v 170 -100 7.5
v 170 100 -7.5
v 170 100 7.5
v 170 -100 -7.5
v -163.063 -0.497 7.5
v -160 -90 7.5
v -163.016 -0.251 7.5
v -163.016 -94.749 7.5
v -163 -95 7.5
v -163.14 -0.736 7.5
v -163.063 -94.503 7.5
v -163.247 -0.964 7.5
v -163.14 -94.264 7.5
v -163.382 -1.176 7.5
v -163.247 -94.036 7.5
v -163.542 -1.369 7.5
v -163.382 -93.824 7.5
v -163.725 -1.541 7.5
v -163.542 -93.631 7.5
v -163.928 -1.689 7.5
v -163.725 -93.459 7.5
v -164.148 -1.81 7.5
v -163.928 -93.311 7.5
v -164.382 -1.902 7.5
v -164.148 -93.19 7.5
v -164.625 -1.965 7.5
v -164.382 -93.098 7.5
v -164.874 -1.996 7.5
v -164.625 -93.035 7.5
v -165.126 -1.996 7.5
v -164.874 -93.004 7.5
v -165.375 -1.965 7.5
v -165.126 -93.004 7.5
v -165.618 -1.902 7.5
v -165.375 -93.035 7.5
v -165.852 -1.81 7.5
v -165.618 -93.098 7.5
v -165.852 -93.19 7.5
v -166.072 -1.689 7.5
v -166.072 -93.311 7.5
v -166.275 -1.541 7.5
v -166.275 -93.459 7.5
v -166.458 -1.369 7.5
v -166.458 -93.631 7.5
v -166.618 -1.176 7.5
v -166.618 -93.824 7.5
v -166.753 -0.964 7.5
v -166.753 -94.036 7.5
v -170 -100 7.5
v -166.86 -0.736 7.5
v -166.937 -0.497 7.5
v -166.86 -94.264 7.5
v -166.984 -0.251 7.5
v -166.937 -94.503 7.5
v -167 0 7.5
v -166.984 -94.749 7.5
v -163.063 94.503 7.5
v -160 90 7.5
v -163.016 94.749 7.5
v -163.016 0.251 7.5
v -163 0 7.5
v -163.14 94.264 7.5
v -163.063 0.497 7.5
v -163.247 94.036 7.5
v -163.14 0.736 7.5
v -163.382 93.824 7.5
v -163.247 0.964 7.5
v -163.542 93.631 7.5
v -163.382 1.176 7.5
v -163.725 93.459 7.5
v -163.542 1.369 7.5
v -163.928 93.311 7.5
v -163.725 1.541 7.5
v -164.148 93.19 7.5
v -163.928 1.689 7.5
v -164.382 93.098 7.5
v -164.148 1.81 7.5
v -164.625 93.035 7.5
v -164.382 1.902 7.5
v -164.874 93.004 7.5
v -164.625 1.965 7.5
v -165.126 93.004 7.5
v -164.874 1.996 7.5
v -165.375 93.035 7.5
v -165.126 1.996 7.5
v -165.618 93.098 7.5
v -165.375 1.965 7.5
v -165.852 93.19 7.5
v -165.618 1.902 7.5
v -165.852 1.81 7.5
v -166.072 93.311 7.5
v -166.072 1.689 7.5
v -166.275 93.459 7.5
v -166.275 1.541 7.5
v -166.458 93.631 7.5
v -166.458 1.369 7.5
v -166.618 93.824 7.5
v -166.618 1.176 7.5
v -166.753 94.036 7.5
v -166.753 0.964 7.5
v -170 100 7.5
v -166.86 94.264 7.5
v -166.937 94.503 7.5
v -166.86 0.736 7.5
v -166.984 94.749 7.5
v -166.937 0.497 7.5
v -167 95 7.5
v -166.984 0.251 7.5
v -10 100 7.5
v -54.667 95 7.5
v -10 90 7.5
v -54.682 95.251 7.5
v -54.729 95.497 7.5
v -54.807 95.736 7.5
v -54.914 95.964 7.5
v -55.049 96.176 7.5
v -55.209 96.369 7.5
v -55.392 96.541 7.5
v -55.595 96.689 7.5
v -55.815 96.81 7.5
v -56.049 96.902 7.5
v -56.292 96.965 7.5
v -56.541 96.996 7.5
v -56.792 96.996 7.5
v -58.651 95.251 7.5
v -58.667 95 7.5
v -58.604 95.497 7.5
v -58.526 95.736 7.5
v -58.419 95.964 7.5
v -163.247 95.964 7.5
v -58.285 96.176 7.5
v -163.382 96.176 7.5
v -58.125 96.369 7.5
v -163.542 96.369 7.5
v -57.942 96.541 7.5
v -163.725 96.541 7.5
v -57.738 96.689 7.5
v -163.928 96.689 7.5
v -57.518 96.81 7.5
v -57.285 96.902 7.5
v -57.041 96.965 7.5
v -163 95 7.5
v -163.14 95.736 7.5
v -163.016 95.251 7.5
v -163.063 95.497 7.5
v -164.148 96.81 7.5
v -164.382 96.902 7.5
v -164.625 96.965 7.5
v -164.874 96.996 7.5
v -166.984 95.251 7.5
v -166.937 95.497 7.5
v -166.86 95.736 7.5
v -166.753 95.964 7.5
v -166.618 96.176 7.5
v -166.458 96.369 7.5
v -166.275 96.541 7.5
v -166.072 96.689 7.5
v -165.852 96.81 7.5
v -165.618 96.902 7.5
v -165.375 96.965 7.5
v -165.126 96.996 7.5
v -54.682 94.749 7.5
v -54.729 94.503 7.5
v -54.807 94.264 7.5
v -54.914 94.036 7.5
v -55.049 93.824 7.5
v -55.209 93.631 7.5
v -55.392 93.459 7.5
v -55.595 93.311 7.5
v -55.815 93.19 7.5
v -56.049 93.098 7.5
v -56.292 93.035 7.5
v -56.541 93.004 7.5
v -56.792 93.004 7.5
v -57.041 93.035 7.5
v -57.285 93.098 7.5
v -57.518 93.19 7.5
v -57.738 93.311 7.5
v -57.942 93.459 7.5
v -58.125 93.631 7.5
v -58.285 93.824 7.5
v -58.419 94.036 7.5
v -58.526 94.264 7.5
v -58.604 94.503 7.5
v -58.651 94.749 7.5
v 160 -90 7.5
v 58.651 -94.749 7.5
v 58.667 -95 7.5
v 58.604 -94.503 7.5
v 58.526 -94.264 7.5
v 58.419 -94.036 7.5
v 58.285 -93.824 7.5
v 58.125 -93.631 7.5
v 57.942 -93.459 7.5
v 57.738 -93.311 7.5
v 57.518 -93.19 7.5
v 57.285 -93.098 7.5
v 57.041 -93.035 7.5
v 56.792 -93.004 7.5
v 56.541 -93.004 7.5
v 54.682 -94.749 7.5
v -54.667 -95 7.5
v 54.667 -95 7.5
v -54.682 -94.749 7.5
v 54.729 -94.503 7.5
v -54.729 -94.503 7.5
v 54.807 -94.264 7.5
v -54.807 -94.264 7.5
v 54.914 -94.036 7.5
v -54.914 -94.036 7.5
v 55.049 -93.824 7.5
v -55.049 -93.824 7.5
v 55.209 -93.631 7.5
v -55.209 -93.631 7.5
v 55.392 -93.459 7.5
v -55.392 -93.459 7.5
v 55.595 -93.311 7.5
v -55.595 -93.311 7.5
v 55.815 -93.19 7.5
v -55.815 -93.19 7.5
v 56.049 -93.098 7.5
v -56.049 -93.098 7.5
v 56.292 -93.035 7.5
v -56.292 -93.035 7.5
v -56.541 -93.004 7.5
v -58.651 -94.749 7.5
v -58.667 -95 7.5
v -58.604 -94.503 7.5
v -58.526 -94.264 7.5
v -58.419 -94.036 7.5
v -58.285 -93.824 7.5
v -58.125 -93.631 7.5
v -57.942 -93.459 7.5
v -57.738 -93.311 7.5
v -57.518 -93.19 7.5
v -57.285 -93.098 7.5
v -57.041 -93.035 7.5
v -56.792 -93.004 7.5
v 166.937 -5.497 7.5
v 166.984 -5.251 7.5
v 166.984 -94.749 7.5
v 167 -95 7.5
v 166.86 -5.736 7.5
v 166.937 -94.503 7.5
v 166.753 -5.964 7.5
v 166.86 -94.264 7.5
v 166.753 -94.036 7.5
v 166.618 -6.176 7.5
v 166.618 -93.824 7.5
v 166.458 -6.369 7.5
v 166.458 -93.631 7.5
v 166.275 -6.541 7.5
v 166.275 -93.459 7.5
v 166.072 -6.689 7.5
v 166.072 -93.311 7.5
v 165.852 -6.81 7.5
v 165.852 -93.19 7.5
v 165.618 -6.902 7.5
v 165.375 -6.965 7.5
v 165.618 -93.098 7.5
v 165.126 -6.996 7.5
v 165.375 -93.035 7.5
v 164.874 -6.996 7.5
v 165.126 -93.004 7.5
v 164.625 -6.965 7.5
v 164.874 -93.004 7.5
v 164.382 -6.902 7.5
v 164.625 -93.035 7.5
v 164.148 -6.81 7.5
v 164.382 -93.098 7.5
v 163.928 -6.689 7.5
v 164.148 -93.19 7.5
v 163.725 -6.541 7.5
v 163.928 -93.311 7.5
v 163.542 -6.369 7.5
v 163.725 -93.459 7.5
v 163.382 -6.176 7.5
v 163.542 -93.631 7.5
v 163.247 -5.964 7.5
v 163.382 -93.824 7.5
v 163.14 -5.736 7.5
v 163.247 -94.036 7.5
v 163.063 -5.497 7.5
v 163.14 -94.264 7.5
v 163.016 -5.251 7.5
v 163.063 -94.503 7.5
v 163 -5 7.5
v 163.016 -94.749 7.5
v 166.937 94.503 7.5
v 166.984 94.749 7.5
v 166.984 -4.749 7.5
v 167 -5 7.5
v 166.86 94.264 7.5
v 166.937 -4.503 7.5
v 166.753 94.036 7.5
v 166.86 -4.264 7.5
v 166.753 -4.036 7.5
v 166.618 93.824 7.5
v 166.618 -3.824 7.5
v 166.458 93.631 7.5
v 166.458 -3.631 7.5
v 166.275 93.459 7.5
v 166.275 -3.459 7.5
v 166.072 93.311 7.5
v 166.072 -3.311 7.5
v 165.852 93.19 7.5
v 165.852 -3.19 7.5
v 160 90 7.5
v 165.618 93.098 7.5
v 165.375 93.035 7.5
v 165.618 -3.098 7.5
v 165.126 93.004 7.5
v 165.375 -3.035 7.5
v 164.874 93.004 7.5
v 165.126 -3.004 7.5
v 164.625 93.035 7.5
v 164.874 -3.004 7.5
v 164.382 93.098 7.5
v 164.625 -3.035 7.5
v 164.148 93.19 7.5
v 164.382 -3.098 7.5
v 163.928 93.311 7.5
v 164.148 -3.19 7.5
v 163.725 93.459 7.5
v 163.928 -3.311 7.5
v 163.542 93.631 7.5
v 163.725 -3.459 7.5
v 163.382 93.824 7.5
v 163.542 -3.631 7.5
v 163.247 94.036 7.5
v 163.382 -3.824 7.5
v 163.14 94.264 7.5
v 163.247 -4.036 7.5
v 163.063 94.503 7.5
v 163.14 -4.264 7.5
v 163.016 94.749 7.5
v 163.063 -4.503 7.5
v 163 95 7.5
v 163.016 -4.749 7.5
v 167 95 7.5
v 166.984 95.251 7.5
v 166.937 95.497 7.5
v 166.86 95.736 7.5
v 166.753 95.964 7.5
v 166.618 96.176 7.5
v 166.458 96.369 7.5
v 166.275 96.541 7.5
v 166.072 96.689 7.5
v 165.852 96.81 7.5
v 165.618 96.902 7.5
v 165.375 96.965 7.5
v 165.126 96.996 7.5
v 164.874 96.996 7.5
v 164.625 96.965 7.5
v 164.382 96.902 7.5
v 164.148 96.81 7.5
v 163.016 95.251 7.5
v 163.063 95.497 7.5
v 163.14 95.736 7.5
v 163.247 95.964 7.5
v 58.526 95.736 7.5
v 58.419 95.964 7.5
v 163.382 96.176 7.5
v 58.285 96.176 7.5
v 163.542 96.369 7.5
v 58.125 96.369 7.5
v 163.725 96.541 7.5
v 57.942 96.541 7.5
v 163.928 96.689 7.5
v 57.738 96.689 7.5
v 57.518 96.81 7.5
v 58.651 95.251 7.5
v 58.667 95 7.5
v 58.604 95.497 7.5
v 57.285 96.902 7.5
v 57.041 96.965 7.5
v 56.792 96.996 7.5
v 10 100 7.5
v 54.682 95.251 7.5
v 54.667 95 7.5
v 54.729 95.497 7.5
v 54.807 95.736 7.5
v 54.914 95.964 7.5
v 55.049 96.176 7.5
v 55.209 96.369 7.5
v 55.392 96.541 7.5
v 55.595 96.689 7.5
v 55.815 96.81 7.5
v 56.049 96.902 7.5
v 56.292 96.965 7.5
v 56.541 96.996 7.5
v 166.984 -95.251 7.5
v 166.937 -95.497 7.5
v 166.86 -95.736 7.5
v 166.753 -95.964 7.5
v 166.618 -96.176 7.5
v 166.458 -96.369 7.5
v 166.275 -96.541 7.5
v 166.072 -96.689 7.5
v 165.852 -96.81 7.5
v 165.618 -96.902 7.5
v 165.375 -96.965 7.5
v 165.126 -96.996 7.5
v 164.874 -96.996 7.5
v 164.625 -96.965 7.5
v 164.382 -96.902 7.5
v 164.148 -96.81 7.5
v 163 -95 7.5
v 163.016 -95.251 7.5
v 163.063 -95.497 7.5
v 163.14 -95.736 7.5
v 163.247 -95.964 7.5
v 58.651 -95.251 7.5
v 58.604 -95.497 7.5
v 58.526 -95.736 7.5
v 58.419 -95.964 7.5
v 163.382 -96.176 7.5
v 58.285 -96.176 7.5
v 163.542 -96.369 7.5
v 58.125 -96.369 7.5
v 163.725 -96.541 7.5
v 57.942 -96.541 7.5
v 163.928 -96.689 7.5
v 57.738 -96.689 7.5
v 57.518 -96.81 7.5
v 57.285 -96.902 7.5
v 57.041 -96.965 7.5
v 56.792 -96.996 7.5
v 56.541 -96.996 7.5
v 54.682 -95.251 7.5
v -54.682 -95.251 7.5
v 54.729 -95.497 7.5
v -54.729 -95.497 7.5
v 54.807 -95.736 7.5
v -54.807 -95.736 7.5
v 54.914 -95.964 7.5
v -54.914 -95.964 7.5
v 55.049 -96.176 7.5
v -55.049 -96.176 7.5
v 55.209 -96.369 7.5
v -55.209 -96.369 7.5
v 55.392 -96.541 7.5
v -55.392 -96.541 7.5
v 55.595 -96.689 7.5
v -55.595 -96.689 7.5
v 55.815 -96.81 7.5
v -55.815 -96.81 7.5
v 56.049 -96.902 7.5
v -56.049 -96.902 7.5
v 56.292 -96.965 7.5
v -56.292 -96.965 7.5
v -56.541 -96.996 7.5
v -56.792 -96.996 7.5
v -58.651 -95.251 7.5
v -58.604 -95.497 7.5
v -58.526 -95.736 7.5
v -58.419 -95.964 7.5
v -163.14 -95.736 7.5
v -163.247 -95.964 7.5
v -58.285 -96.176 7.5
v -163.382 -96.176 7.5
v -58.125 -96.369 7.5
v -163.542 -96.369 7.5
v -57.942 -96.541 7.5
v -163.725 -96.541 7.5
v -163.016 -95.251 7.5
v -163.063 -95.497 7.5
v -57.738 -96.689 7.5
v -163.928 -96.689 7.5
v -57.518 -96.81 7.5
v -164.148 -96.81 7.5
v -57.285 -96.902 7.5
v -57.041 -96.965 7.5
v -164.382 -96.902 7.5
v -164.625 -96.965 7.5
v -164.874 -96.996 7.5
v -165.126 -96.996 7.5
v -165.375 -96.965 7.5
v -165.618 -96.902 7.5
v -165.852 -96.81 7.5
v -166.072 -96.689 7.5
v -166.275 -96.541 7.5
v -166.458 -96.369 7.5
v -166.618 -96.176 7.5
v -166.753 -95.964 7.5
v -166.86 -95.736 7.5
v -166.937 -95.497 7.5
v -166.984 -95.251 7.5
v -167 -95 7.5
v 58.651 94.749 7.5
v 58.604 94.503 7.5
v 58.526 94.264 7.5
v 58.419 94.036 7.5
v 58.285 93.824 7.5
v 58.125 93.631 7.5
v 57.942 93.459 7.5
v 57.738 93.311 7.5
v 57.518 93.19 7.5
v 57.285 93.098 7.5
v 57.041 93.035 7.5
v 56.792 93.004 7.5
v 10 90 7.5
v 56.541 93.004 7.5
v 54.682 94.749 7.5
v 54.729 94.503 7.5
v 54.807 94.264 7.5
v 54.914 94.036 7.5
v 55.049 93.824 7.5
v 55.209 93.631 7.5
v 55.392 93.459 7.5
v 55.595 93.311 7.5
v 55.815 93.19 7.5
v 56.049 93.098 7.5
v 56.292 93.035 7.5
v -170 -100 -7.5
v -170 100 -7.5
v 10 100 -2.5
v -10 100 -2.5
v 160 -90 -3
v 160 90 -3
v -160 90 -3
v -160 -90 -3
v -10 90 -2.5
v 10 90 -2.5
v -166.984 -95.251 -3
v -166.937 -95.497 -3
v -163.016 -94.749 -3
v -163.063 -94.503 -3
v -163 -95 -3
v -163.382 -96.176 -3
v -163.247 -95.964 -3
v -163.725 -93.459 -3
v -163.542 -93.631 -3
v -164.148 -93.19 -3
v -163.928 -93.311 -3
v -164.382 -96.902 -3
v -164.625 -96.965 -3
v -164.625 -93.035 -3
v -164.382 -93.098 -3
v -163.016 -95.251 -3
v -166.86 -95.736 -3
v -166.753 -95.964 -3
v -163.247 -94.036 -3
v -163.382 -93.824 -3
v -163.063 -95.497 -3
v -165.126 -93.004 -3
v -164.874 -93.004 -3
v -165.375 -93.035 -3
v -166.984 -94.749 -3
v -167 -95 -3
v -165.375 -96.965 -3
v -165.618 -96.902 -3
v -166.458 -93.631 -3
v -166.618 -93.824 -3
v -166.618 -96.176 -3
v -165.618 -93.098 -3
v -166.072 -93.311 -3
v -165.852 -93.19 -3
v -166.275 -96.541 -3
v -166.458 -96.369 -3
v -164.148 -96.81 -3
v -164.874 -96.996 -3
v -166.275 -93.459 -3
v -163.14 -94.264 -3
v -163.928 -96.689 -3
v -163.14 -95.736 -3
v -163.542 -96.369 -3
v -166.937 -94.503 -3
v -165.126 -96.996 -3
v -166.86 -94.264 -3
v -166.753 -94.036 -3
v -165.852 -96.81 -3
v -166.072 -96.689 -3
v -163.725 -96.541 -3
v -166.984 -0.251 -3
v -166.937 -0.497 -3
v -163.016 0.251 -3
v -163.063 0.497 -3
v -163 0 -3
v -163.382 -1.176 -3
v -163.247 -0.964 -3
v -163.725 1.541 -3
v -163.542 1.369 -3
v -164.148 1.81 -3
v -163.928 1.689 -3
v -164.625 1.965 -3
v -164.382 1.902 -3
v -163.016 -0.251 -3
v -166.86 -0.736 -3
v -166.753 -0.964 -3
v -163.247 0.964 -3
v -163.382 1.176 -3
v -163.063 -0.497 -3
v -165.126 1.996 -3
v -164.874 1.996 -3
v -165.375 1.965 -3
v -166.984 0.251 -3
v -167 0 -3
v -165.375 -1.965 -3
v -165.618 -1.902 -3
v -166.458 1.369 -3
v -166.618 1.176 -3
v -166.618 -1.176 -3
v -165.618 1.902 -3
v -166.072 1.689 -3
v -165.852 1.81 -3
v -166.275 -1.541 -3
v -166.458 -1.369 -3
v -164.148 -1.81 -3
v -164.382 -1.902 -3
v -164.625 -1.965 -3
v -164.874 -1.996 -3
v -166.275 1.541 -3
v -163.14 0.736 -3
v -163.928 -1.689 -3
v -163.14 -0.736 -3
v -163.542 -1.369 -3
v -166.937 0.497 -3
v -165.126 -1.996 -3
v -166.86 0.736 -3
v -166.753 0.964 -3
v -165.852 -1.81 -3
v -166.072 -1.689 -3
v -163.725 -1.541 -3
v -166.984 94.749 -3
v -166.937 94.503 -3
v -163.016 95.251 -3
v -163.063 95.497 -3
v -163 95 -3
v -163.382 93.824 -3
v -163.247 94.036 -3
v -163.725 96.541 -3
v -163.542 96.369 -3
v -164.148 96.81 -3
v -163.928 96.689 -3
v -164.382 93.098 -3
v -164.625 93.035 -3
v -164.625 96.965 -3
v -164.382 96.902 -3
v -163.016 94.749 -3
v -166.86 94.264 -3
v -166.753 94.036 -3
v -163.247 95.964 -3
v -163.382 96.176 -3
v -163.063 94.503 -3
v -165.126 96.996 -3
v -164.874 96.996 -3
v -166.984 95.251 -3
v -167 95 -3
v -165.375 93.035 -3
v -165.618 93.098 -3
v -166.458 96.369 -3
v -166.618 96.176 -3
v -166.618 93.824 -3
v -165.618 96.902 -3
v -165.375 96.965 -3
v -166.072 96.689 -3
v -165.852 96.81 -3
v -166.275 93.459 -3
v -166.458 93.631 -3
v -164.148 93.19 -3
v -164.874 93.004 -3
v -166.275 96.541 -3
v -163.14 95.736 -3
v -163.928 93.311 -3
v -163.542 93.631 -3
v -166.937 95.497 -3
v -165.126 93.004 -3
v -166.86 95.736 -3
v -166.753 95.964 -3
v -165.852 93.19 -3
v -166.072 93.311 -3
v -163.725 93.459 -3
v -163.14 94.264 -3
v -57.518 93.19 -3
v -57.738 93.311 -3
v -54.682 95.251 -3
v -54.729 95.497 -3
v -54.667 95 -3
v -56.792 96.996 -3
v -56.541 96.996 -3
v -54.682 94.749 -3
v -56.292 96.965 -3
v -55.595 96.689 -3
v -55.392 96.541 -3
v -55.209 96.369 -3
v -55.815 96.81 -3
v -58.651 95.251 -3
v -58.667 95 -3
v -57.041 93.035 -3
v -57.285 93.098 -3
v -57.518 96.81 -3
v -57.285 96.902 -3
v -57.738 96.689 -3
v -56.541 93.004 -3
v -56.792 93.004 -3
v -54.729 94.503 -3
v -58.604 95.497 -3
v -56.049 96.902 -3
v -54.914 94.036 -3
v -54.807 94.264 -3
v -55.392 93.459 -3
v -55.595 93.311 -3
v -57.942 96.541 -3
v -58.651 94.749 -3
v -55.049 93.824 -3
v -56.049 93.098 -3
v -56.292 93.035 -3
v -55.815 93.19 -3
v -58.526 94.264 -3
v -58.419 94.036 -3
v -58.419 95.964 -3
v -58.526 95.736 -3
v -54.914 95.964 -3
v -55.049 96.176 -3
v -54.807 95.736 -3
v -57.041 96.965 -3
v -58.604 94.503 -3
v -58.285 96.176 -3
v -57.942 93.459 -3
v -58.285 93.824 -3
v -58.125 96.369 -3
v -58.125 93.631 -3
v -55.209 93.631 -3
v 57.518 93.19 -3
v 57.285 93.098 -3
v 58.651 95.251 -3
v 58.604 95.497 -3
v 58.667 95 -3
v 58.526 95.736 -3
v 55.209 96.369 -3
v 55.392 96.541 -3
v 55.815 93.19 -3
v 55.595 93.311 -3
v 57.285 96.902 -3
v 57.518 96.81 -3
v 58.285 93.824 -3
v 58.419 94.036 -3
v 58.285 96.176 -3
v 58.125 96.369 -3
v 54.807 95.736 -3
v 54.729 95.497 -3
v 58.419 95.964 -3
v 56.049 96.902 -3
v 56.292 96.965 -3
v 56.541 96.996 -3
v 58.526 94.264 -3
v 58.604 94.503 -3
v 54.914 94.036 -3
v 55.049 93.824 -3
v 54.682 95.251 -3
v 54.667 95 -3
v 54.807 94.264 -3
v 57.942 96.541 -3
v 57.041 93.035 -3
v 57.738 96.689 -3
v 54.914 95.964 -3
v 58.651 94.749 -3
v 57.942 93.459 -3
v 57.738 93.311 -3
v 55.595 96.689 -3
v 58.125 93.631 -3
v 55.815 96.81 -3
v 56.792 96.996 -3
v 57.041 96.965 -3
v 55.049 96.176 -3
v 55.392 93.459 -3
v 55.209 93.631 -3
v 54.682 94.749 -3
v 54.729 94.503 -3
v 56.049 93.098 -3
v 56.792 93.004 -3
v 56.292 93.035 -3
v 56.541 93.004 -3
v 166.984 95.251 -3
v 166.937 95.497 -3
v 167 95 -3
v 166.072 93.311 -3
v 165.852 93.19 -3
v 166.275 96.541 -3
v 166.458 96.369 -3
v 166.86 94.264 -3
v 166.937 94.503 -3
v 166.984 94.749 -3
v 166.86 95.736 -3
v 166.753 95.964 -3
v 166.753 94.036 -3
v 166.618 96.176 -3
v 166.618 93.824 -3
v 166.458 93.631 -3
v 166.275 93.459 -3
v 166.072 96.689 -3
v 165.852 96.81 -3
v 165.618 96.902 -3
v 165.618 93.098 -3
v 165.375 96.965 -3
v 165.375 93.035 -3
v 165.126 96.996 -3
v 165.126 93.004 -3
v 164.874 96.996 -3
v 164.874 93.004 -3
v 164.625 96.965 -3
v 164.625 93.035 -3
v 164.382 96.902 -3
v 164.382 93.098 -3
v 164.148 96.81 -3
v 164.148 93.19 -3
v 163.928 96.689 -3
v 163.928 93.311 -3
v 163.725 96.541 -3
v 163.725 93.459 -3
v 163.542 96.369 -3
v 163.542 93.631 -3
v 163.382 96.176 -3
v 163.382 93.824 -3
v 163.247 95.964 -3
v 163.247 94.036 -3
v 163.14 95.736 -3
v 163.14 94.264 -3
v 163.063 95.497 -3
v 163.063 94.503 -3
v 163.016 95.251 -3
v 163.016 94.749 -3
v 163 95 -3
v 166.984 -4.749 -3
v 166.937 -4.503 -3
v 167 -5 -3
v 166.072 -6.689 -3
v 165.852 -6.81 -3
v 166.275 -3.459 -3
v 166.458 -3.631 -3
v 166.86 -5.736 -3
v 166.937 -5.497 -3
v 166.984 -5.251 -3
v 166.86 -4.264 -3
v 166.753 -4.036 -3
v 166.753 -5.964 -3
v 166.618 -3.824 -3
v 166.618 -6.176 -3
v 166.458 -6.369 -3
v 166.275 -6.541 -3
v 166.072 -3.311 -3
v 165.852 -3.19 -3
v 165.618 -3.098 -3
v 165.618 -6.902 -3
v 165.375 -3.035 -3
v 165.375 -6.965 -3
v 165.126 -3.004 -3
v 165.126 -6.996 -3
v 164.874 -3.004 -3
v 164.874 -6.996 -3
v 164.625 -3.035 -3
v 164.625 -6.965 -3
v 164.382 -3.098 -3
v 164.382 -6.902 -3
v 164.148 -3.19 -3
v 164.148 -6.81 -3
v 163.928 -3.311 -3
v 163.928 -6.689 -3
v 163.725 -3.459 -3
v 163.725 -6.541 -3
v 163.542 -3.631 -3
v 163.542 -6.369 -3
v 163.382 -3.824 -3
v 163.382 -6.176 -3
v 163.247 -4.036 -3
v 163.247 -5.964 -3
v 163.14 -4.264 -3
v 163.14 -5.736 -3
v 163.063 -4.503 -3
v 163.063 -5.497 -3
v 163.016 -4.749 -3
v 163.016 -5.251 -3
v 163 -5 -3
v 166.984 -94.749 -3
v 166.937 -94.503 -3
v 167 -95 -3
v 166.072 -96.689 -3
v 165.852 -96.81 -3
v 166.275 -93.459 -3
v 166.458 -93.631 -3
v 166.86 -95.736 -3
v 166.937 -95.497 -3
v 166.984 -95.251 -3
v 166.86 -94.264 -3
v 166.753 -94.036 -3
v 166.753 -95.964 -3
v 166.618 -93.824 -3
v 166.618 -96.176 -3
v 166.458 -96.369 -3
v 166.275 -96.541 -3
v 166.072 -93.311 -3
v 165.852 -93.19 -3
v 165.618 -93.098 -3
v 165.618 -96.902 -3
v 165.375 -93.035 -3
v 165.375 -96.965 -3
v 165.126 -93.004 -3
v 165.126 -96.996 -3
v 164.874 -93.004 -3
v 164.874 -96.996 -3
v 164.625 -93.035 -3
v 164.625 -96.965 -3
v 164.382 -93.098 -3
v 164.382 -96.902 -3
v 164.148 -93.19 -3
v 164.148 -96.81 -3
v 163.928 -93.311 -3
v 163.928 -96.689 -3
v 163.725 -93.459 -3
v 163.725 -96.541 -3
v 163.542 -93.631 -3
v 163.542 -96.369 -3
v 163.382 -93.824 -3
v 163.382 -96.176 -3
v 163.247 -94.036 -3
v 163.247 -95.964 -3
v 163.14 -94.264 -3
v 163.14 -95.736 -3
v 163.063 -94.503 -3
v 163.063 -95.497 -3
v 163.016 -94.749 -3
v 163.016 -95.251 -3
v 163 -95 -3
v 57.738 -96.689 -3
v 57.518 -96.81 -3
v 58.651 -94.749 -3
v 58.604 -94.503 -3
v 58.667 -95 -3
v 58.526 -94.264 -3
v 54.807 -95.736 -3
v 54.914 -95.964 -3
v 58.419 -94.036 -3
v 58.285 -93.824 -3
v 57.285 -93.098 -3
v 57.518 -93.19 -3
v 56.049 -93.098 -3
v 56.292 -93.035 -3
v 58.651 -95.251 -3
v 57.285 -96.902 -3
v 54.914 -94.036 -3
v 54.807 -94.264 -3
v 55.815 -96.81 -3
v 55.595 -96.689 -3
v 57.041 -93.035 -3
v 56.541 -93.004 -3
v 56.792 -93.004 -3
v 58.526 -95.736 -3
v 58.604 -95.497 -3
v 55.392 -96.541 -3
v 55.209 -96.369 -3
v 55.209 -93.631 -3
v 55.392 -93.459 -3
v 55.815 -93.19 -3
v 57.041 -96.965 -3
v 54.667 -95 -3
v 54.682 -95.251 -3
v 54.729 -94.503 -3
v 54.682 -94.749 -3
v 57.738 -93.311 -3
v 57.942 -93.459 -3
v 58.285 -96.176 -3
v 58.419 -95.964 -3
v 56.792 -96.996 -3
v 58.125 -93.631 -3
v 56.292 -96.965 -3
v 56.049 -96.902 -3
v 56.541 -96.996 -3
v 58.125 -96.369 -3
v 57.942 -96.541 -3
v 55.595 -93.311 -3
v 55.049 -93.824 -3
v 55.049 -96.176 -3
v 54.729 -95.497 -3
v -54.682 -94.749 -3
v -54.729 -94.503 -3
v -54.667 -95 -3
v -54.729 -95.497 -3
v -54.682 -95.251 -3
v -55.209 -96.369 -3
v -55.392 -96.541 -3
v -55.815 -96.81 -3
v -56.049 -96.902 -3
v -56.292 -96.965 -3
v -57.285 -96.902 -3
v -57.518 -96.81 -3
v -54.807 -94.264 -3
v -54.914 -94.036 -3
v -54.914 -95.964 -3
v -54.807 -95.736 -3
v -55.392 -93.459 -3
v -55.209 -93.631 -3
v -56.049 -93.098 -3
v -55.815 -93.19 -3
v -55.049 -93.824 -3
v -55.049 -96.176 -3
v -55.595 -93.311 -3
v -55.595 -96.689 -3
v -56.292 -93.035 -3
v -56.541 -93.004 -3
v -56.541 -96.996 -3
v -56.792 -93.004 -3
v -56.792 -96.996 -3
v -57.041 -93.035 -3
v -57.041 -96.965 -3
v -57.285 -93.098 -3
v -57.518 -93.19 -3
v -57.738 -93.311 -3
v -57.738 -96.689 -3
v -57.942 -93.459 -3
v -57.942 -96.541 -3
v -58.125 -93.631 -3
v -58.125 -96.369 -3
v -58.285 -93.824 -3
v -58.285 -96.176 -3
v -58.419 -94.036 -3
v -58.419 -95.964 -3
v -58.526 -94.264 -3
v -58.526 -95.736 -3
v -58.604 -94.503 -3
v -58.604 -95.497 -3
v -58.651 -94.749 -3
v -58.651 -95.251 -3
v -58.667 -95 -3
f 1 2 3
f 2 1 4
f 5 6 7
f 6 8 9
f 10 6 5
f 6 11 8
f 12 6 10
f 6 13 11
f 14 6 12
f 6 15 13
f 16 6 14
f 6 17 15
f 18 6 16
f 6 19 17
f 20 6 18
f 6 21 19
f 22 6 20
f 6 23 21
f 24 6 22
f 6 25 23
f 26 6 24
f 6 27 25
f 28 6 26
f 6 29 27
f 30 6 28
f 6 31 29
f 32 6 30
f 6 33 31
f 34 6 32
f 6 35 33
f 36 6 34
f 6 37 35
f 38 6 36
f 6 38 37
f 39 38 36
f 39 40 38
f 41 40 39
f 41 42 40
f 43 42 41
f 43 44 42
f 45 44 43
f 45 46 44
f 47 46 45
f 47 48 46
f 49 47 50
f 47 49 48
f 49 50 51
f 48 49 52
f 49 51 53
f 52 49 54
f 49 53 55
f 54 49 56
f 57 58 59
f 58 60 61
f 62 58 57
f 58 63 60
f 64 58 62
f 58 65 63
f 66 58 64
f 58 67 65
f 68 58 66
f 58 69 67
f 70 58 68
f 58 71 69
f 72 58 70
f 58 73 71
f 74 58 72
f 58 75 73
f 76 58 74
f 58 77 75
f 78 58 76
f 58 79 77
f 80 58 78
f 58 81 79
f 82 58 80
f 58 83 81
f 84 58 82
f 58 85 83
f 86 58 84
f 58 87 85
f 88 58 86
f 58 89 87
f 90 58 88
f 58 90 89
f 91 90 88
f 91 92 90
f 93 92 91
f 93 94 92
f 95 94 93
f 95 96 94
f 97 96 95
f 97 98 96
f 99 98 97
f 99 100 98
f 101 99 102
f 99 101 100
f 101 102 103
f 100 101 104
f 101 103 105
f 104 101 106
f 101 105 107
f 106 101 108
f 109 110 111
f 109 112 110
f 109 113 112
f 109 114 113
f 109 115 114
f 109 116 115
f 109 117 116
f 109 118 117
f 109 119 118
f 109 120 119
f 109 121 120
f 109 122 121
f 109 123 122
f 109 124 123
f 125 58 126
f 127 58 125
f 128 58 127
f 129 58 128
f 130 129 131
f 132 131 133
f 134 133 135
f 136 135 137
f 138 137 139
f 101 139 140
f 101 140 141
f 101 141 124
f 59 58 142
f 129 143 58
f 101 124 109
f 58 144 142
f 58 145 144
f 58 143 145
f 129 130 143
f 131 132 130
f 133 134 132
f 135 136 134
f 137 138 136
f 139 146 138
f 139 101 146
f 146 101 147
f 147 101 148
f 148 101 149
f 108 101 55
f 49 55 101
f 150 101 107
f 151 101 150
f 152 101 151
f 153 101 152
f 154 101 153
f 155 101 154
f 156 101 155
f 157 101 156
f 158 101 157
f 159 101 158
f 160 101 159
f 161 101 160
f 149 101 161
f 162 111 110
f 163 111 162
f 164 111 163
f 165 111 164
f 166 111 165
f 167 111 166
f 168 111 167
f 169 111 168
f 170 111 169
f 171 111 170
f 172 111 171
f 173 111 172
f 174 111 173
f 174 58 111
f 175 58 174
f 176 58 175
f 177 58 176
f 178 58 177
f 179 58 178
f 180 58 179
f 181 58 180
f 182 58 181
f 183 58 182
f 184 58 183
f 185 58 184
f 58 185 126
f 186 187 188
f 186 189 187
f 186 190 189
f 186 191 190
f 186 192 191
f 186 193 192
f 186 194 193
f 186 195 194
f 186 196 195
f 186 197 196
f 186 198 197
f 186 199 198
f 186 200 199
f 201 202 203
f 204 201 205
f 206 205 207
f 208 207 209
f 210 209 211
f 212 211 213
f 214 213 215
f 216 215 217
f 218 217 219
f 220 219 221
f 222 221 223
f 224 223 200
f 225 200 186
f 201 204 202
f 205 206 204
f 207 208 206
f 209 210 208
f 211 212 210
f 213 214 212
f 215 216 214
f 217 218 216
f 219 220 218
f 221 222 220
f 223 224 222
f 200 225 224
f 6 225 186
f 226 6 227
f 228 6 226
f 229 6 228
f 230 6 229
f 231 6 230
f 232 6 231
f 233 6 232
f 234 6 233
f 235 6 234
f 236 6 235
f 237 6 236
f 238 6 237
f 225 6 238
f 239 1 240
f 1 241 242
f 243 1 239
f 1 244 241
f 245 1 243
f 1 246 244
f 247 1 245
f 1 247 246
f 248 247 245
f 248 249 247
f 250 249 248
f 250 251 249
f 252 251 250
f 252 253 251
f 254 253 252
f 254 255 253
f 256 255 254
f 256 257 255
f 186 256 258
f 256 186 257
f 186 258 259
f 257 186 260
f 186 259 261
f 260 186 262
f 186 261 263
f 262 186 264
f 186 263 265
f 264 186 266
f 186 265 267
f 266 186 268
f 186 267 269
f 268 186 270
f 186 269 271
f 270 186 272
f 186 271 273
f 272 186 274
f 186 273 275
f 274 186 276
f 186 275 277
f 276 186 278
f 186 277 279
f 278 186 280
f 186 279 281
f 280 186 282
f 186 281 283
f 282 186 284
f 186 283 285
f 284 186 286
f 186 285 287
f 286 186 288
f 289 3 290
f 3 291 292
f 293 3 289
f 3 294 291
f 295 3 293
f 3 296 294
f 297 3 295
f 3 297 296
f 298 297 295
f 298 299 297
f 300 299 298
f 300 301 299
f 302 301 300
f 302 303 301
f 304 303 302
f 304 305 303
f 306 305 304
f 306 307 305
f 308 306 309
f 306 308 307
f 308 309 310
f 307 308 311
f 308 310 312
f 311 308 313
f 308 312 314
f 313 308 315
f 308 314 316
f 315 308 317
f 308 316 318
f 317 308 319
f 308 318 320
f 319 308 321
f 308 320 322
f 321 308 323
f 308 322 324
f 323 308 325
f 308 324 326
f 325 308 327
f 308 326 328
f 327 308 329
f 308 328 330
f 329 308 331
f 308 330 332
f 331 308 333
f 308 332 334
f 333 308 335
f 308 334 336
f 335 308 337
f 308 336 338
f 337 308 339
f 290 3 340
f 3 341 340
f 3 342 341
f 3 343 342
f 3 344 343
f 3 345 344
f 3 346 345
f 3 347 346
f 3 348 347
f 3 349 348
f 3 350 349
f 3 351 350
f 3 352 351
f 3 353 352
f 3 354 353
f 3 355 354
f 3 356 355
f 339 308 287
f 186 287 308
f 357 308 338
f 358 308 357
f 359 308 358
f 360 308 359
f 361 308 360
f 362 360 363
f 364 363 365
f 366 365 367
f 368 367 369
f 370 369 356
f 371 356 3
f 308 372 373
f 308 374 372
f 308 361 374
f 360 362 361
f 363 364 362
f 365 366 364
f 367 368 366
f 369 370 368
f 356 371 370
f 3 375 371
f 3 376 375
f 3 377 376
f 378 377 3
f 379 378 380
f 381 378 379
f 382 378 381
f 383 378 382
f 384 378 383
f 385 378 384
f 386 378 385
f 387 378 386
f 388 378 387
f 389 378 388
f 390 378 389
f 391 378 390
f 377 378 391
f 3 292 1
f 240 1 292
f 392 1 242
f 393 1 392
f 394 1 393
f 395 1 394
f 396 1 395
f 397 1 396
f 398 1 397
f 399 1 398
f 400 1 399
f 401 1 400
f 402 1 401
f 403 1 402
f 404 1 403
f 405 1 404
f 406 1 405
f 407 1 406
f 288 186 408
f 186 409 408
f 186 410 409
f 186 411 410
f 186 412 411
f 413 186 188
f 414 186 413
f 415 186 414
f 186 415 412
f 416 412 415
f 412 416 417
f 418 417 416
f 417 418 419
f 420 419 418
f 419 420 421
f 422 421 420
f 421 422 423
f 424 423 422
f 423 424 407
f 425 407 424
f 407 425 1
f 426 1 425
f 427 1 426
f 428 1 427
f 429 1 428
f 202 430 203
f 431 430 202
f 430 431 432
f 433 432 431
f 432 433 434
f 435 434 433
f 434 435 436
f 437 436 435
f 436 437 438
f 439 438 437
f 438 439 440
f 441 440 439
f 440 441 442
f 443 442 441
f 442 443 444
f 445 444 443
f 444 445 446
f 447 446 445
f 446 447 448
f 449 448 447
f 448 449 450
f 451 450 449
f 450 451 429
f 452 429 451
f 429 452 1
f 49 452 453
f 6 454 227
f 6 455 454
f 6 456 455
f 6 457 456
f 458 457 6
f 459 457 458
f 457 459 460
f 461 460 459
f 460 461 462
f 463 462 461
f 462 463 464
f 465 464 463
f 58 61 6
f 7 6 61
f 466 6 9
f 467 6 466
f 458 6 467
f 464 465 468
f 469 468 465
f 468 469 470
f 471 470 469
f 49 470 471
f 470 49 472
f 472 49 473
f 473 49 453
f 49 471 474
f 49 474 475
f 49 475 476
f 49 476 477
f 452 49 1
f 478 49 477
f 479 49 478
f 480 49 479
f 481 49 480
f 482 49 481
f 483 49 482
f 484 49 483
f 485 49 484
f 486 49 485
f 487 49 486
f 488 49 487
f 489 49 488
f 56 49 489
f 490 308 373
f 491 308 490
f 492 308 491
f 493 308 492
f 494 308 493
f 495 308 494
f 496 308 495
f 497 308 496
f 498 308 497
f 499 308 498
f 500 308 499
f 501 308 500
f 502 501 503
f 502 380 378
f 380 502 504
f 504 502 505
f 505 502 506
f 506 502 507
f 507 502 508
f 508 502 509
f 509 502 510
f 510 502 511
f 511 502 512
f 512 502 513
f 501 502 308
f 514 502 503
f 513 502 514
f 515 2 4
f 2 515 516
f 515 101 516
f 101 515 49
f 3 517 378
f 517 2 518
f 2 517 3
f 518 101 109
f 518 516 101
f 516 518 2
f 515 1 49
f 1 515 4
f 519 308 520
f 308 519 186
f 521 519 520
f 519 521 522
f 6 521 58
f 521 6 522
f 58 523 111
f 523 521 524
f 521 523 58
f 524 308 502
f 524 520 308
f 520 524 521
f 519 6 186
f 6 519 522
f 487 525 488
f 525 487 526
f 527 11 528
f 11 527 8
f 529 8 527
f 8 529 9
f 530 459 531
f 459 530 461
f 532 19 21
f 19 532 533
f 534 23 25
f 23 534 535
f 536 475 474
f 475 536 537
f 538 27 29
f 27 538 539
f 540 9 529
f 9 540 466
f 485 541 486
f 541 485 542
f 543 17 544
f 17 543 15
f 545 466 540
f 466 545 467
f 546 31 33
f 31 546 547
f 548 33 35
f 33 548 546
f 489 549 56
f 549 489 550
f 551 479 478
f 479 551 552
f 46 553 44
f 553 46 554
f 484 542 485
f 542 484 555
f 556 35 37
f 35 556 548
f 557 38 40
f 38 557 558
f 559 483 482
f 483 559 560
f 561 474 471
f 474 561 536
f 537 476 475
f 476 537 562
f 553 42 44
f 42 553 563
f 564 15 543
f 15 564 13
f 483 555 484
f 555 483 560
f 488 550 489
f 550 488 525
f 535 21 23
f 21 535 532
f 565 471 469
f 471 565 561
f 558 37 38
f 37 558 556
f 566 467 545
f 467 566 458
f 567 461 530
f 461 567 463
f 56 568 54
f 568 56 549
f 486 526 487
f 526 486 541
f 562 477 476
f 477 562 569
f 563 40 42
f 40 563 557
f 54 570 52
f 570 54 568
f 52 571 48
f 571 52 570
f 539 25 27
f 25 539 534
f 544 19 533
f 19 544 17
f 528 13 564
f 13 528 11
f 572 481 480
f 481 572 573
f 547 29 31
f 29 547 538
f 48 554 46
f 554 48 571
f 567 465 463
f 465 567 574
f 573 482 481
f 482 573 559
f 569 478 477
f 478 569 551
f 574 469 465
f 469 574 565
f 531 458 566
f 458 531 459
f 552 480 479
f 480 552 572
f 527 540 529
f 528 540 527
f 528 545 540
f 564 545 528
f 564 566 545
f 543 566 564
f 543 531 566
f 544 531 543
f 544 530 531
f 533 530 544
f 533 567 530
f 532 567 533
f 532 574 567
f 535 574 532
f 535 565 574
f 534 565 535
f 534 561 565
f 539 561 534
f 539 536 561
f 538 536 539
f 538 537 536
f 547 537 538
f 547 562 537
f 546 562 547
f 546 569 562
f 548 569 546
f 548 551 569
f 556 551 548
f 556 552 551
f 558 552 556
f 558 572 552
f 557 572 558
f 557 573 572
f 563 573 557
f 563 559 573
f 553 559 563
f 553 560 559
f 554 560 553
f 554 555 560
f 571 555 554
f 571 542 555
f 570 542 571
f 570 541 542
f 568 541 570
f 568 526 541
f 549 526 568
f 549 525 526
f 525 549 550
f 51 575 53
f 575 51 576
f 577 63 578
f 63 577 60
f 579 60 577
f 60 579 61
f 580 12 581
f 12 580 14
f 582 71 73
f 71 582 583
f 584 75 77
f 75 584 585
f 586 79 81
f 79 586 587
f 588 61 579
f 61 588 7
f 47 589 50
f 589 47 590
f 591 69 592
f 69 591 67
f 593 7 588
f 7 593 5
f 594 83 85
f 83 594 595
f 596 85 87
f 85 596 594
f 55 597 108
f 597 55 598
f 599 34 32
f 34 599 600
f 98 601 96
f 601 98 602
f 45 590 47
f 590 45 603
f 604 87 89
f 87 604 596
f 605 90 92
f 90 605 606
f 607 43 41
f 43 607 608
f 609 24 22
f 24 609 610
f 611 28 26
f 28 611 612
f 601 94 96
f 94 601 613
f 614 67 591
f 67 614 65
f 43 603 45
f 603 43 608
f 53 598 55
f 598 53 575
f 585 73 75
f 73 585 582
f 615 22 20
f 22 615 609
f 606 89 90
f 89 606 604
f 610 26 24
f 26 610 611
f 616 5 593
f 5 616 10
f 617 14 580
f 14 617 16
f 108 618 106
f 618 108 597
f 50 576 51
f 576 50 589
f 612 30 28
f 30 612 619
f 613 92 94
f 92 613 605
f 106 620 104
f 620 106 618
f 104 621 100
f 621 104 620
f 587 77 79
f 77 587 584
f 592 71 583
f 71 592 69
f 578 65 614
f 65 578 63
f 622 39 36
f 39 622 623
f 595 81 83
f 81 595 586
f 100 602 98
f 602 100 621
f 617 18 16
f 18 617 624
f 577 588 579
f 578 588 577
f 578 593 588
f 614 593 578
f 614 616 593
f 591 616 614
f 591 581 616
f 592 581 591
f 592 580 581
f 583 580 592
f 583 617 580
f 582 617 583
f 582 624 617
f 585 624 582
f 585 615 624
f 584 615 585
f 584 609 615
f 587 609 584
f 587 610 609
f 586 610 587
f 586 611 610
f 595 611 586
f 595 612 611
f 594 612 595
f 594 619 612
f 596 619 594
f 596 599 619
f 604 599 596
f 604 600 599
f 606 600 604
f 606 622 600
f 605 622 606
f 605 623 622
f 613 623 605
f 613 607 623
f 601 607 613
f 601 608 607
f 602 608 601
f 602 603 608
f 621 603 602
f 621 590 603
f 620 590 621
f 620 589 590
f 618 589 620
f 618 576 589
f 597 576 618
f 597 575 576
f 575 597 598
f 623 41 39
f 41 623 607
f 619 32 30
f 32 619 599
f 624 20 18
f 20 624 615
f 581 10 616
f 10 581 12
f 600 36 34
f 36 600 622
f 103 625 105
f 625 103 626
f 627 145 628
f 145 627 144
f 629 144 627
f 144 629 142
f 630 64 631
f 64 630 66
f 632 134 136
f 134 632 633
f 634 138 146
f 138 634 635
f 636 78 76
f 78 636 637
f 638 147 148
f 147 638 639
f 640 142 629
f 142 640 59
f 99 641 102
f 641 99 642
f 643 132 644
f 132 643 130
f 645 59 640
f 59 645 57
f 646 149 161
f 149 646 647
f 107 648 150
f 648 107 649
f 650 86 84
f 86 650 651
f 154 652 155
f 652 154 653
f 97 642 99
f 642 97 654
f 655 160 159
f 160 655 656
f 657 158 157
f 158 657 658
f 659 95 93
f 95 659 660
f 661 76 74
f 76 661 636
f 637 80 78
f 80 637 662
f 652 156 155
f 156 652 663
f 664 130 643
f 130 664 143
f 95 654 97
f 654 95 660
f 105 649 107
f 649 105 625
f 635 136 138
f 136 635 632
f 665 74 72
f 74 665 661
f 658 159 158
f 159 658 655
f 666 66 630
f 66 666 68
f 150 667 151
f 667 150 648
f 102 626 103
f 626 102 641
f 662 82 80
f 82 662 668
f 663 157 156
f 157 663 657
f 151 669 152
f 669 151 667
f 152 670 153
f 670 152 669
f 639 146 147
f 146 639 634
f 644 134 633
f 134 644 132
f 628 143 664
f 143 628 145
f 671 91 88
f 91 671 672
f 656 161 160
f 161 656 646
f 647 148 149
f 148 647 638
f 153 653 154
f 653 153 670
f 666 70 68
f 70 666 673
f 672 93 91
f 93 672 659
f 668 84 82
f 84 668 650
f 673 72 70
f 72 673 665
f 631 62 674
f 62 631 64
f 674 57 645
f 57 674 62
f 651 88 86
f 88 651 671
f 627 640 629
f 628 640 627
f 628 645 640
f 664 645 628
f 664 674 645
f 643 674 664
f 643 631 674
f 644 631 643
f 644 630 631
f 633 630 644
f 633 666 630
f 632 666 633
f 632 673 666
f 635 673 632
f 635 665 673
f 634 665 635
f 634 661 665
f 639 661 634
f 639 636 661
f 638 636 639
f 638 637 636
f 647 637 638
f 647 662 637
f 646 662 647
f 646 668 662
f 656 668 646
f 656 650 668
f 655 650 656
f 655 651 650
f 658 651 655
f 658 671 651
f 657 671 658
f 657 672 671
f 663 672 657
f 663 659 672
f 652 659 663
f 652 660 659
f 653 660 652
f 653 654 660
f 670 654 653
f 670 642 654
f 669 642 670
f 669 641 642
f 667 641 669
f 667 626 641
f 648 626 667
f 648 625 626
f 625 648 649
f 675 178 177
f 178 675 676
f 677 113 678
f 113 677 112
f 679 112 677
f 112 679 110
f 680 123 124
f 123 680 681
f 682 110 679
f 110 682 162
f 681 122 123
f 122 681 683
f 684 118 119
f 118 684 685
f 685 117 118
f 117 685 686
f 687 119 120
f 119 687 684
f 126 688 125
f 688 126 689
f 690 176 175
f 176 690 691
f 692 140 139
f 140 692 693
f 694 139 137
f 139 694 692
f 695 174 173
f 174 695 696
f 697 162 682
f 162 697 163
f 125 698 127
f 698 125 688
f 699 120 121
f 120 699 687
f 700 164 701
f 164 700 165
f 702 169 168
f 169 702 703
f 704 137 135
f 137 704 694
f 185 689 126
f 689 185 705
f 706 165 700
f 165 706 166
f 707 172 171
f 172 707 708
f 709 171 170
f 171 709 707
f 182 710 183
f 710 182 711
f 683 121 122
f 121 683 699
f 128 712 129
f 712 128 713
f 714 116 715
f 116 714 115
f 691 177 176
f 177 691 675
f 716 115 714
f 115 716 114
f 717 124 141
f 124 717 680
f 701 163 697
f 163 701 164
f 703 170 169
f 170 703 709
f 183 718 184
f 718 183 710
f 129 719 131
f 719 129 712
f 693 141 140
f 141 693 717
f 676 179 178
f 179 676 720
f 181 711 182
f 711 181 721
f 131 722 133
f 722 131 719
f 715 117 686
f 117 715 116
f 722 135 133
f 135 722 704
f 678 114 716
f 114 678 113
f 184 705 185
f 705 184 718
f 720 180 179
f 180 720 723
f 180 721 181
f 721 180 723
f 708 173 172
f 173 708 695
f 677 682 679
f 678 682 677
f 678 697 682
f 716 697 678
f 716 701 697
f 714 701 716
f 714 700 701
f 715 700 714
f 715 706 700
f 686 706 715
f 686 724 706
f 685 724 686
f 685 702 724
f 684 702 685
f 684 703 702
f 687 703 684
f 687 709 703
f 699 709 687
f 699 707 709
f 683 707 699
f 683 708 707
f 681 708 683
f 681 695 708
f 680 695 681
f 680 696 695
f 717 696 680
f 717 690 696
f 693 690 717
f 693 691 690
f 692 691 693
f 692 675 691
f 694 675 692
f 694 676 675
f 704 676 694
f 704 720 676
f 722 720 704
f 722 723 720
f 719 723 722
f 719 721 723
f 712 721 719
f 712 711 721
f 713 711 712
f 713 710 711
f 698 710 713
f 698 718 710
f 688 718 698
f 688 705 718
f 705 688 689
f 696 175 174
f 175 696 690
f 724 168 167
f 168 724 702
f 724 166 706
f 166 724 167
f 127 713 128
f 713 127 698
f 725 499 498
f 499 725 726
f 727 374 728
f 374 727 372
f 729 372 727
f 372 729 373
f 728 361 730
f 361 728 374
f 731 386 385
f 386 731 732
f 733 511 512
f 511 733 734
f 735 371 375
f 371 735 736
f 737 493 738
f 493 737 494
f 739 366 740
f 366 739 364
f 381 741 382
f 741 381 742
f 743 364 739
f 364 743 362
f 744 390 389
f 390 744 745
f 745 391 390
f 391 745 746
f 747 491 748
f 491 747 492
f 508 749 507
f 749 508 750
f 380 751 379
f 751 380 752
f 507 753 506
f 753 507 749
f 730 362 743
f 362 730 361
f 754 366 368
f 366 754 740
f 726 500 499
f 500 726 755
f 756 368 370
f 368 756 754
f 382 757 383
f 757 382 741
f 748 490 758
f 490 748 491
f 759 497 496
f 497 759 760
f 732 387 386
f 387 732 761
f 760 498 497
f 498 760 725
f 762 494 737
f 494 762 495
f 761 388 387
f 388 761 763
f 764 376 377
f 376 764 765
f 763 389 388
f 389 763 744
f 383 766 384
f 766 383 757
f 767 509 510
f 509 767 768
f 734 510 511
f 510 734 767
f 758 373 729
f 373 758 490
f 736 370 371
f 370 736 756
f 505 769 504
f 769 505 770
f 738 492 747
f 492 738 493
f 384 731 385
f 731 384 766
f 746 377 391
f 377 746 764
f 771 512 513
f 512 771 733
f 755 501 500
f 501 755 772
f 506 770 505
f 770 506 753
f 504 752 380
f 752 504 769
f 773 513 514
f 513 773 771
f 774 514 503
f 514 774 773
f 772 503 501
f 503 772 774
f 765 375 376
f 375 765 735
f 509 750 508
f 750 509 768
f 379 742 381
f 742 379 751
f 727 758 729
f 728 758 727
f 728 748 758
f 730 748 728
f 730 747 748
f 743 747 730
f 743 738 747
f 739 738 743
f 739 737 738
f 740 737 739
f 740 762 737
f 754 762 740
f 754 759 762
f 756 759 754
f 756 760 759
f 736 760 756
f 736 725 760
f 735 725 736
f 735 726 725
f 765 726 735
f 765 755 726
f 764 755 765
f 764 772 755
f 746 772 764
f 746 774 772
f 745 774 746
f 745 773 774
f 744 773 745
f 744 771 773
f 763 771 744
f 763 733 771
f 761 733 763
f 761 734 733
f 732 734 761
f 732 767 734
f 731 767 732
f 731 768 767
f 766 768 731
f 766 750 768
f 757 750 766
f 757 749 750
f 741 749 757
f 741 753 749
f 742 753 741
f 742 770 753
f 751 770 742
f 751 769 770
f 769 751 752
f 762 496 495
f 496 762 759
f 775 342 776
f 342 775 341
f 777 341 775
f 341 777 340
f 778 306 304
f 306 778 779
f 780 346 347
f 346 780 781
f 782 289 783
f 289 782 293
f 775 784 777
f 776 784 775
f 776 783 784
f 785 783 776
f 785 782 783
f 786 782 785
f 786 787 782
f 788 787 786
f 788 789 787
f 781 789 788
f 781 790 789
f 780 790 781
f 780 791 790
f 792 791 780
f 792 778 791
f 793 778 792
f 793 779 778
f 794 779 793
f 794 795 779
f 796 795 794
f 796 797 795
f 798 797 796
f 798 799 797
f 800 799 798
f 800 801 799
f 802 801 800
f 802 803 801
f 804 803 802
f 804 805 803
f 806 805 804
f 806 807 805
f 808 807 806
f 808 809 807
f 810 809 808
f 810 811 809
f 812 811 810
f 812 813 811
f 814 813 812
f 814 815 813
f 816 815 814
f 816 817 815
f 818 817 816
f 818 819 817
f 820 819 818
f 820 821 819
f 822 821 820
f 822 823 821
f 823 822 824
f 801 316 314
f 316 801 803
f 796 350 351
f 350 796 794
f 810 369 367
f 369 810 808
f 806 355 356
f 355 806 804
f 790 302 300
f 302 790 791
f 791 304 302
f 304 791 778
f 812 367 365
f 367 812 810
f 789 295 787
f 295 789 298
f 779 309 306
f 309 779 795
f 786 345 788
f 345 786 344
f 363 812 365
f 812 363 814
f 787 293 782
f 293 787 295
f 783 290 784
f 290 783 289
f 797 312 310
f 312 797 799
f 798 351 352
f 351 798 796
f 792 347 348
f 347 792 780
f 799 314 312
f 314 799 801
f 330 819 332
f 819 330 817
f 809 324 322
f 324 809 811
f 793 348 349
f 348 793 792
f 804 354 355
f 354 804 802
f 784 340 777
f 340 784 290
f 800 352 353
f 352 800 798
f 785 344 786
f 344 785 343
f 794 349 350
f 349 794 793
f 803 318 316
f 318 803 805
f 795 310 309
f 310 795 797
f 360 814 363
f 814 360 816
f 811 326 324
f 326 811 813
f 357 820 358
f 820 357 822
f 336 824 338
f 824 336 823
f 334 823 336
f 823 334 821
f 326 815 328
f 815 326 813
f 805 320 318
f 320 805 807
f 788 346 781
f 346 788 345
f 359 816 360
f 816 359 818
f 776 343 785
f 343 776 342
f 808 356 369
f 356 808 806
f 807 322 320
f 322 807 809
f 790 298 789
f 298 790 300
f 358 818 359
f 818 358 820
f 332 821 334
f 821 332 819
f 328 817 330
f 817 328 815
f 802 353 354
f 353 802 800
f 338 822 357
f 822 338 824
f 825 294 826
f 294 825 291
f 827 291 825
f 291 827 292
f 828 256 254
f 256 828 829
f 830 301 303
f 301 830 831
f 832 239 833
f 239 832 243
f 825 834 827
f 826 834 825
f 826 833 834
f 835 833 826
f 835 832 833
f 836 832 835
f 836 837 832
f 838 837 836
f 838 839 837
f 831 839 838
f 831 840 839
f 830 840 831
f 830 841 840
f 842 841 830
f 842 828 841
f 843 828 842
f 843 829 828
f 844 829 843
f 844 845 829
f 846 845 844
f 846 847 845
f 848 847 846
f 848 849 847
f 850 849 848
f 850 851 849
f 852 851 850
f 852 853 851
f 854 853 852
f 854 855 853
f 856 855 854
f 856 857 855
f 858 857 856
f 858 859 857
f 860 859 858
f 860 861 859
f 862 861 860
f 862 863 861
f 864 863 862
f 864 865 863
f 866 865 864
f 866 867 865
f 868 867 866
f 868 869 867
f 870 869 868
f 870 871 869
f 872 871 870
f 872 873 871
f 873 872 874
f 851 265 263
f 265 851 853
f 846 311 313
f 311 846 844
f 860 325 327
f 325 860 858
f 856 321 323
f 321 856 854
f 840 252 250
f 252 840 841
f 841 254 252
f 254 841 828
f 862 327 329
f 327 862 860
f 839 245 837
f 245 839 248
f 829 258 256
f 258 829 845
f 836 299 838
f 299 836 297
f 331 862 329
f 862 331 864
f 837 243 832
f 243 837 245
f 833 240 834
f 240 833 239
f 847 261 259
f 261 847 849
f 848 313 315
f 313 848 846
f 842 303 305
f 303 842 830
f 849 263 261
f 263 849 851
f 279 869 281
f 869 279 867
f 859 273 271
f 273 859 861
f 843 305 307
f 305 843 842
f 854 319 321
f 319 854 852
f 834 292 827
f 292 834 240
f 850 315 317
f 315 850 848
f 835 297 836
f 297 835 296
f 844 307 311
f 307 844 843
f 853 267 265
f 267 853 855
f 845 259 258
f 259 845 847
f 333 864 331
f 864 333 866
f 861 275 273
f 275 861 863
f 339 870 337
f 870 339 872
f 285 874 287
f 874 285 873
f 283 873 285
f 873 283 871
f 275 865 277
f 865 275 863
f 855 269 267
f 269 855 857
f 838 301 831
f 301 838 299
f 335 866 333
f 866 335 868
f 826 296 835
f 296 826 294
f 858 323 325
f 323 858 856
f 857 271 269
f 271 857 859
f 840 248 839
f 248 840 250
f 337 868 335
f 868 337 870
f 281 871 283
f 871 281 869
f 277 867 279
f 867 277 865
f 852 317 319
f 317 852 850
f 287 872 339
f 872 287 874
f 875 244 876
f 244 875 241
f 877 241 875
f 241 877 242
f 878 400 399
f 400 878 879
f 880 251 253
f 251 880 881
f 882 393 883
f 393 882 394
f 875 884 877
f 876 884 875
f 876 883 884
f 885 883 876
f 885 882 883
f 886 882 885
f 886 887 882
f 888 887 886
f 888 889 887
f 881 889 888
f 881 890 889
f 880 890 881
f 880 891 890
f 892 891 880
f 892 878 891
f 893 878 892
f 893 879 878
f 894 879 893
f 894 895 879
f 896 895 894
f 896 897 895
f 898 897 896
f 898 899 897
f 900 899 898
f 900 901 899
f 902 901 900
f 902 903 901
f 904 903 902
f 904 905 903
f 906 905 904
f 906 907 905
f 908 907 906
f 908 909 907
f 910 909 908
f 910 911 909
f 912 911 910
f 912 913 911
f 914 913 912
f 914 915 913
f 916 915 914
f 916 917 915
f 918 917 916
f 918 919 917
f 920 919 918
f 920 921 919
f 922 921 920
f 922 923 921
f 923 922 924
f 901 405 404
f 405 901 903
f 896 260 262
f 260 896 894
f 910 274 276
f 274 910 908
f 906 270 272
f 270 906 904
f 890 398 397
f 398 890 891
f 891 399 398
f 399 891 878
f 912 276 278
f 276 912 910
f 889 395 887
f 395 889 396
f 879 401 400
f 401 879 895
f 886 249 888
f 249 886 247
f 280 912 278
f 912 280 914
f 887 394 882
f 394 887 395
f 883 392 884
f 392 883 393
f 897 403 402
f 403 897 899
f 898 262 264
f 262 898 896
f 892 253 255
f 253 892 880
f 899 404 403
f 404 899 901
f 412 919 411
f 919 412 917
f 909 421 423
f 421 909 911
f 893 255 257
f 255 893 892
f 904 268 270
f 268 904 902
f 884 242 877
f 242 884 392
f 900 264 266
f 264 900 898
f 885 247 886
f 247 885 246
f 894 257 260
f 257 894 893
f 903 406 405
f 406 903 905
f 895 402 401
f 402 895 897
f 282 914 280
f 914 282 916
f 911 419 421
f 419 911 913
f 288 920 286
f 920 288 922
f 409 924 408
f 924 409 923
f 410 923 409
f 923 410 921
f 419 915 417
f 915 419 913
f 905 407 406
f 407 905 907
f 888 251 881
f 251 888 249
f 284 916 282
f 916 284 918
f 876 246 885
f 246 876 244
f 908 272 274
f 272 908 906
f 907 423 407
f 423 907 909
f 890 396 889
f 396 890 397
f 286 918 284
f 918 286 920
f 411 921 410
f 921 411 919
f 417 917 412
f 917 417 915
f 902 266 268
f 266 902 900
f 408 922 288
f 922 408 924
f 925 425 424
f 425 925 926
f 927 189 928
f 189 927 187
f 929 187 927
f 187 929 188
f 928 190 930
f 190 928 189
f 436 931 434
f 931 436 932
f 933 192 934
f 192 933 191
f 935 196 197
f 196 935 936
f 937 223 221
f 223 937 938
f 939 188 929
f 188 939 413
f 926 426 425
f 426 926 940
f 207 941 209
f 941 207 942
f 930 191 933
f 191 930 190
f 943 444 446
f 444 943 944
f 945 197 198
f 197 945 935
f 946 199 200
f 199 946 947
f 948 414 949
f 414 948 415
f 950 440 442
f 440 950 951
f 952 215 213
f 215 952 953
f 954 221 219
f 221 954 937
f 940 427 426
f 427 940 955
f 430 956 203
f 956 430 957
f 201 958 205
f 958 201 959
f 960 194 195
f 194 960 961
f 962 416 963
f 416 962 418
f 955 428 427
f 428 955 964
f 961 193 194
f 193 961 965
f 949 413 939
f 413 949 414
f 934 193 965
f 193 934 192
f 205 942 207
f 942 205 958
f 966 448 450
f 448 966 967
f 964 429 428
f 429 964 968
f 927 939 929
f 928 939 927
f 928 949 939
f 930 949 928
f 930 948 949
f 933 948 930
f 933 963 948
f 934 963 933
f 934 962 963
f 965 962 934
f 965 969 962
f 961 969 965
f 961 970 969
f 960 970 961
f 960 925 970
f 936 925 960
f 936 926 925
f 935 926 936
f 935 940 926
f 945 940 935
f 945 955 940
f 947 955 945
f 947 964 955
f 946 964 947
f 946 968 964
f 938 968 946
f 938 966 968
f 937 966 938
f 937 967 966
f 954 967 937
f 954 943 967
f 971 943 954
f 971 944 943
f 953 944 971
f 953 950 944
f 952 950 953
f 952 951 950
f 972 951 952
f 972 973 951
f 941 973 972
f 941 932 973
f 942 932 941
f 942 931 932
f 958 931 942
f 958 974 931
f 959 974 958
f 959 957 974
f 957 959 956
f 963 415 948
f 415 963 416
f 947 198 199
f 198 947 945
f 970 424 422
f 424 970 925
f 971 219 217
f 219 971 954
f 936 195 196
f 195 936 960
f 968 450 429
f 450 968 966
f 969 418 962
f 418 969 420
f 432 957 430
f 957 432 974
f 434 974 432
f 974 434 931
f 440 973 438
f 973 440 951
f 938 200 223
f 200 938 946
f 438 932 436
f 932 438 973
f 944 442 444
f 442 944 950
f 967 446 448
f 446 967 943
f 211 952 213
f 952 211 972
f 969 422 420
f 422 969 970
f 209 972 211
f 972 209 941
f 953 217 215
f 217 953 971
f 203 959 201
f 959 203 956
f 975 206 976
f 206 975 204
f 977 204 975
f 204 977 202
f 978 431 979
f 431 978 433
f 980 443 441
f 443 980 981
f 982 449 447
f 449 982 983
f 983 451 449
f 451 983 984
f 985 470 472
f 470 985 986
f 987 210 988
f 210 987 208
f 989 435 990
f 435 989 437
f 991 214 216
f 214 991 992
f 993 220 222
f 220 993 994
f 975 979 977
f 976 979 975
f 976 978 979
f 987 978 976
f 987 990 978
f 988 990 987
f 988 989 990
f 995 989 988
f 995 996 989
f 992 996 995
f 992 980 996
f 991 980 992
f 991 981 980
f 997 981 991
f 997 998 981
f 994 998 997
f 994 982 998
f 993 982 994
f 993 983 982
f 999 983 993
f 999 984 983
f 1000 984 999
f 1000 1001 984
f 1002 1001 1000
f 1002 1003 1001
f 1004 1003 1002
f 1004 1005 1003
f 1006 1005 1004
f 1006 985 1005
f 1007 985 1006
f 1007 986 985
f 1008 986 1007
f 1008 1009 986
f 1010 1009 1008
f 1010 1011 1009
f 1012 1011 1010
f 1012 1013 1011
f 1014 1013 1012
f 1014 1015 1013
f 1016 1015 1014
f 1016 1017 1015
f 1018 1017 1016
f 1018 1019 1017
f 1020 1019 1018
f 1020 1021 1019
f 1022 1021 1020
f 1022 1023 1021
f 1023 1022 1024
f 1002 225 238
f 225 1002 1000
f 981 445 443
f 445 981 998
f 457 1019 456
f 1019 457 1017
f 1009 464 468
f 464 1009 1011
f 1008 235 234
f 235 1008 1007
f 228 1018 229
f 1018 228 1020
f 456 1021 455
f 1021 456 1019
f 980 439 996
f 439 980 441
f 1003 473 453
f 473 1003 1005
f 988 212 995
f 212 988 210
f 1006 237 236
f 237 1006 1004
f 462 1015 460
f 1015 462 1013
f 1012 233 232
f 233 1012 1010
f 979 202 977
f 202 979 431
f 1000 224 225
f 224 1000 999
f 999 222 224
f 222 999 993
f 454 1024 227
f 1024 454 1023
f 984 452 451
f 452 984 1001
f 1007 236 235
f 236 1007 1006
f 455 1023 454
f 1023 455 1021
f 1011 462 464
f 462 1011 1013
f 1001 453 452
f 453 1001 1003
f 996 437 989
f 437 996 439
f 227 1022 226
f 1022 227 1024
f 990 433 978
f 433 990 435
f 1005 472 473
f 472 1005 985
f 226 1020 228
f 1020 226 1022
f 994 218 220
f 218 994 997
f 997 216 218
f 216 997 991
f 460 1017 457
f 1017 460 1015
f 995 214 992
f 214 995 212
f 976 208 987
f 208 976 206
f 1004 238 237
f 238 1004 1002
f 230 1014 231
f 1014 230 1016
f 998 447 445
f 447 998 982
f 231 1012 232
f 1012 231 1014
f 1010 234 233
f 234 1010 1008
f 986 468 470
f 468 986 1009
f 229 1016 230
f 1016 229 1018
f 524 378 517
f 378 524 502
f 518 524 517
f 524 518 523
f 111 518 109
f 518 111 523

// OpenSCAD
/**
 * Copyright (C) 2015, xp@renzhi.ca, all rights reserverd.
 */

/**
 * Note: Dimension units are all in mm, except angle, which is in degrees.
 */

// Thickness of entire plate
plate_thickness = 3;
wall_thickeness = 10;
wall_height = 12;
plate_length = 340;
plate_width = 200;

bottom_left_x = -(plate_length / 2);
bottom_left_y = -(plate_width / 2);

//Radius of mounting screw holes
screw_hole_radius = 2;
// Distance of a screw from the edge
screw_dist_edge = 5;

pos_z = ((plate_thickness+wall_thickeness)/2) - (((plate_thickness+wall_thickeness)/2) - plate_thickness);

screw_holes = [
     // Starting at the bottom left corner, and moving clock-wise.

     // Bottom left corner
     [bottom_left_x + screw_dist_edge, bottom_left_y + screw_dist_edge, pos_z],

     // Middle of the left edge
     [bottom_left_x + screw_dist_edge, bottom_left_y + plate_width/2, pos_z],

     // Top left corner
     [bottom_left_x + screw_dist_edge, bottom_left_y + plate_width - screw_dist_edge, pos_z],

     // 2 holes on the top edge
     [bottom_left_x + plate_length/3, bottom_left_y + plate_width - screw_dist_edge, pos_z],
     [bottom_left_x + plate_length/3*2, bottom_left_y + plate_width - screw_dist_edge, pos_z],

     // Top right corner
     [bottom_left_x + plate_length - screw_dist_edge, bottom_left_y + plate_width - screw_dist_edge, pos_z],

     // Middle of the right edge
     [bottom_left_x + plate_length - screw_dist_edge, bottom_left_y + plate_width/2 - screw_dist_edge, pos_z],

     // Bottom right corner
     [bottom_left_x + plate_length - screw_dist_edge, bottom_left_y + screw_dist_edge, pos_z],

     // 2 holes on the bottom edge
     [bottom_left_x + plate_length/3*2, bottom_left_y + screw_dist_edge, pos_z],
     [bottom_left_x + plate_length/3, bottom_left_y + screw_dist_edge, pos_z],

     ];

module mounting_holes(){
     for (key = screw_holes) {
          translate([key[0], key[1], key[2]])
               cylinder(h=wall_height, r=screw_hole_radius, $fn=50, center=true);
     }
}

module usb_hole() {
     translate([bottom_left_x + (plate_length/2) - 10, bottom_left_y + plate_width - 10, (plate_thickness+wall_height)/2 - 10])
          cube([20,20,10]);
}

module bottom_box(h, w) {
     difference() {
          cube([h, w, plate_thickness + wall_height], center=true);
          translate([0,0,pos_z])
               cube([h - (wall_thickeness*2), w - (wall_thickeness*2), wall_height], center=true);
     }
}

module renzhi_bottom_plate() {
     difference() {
          bottom_box(plate_length, plate_width);
          mounting_holes();
          usb_hole();
     }
}

renzhi_bottom_plate();
